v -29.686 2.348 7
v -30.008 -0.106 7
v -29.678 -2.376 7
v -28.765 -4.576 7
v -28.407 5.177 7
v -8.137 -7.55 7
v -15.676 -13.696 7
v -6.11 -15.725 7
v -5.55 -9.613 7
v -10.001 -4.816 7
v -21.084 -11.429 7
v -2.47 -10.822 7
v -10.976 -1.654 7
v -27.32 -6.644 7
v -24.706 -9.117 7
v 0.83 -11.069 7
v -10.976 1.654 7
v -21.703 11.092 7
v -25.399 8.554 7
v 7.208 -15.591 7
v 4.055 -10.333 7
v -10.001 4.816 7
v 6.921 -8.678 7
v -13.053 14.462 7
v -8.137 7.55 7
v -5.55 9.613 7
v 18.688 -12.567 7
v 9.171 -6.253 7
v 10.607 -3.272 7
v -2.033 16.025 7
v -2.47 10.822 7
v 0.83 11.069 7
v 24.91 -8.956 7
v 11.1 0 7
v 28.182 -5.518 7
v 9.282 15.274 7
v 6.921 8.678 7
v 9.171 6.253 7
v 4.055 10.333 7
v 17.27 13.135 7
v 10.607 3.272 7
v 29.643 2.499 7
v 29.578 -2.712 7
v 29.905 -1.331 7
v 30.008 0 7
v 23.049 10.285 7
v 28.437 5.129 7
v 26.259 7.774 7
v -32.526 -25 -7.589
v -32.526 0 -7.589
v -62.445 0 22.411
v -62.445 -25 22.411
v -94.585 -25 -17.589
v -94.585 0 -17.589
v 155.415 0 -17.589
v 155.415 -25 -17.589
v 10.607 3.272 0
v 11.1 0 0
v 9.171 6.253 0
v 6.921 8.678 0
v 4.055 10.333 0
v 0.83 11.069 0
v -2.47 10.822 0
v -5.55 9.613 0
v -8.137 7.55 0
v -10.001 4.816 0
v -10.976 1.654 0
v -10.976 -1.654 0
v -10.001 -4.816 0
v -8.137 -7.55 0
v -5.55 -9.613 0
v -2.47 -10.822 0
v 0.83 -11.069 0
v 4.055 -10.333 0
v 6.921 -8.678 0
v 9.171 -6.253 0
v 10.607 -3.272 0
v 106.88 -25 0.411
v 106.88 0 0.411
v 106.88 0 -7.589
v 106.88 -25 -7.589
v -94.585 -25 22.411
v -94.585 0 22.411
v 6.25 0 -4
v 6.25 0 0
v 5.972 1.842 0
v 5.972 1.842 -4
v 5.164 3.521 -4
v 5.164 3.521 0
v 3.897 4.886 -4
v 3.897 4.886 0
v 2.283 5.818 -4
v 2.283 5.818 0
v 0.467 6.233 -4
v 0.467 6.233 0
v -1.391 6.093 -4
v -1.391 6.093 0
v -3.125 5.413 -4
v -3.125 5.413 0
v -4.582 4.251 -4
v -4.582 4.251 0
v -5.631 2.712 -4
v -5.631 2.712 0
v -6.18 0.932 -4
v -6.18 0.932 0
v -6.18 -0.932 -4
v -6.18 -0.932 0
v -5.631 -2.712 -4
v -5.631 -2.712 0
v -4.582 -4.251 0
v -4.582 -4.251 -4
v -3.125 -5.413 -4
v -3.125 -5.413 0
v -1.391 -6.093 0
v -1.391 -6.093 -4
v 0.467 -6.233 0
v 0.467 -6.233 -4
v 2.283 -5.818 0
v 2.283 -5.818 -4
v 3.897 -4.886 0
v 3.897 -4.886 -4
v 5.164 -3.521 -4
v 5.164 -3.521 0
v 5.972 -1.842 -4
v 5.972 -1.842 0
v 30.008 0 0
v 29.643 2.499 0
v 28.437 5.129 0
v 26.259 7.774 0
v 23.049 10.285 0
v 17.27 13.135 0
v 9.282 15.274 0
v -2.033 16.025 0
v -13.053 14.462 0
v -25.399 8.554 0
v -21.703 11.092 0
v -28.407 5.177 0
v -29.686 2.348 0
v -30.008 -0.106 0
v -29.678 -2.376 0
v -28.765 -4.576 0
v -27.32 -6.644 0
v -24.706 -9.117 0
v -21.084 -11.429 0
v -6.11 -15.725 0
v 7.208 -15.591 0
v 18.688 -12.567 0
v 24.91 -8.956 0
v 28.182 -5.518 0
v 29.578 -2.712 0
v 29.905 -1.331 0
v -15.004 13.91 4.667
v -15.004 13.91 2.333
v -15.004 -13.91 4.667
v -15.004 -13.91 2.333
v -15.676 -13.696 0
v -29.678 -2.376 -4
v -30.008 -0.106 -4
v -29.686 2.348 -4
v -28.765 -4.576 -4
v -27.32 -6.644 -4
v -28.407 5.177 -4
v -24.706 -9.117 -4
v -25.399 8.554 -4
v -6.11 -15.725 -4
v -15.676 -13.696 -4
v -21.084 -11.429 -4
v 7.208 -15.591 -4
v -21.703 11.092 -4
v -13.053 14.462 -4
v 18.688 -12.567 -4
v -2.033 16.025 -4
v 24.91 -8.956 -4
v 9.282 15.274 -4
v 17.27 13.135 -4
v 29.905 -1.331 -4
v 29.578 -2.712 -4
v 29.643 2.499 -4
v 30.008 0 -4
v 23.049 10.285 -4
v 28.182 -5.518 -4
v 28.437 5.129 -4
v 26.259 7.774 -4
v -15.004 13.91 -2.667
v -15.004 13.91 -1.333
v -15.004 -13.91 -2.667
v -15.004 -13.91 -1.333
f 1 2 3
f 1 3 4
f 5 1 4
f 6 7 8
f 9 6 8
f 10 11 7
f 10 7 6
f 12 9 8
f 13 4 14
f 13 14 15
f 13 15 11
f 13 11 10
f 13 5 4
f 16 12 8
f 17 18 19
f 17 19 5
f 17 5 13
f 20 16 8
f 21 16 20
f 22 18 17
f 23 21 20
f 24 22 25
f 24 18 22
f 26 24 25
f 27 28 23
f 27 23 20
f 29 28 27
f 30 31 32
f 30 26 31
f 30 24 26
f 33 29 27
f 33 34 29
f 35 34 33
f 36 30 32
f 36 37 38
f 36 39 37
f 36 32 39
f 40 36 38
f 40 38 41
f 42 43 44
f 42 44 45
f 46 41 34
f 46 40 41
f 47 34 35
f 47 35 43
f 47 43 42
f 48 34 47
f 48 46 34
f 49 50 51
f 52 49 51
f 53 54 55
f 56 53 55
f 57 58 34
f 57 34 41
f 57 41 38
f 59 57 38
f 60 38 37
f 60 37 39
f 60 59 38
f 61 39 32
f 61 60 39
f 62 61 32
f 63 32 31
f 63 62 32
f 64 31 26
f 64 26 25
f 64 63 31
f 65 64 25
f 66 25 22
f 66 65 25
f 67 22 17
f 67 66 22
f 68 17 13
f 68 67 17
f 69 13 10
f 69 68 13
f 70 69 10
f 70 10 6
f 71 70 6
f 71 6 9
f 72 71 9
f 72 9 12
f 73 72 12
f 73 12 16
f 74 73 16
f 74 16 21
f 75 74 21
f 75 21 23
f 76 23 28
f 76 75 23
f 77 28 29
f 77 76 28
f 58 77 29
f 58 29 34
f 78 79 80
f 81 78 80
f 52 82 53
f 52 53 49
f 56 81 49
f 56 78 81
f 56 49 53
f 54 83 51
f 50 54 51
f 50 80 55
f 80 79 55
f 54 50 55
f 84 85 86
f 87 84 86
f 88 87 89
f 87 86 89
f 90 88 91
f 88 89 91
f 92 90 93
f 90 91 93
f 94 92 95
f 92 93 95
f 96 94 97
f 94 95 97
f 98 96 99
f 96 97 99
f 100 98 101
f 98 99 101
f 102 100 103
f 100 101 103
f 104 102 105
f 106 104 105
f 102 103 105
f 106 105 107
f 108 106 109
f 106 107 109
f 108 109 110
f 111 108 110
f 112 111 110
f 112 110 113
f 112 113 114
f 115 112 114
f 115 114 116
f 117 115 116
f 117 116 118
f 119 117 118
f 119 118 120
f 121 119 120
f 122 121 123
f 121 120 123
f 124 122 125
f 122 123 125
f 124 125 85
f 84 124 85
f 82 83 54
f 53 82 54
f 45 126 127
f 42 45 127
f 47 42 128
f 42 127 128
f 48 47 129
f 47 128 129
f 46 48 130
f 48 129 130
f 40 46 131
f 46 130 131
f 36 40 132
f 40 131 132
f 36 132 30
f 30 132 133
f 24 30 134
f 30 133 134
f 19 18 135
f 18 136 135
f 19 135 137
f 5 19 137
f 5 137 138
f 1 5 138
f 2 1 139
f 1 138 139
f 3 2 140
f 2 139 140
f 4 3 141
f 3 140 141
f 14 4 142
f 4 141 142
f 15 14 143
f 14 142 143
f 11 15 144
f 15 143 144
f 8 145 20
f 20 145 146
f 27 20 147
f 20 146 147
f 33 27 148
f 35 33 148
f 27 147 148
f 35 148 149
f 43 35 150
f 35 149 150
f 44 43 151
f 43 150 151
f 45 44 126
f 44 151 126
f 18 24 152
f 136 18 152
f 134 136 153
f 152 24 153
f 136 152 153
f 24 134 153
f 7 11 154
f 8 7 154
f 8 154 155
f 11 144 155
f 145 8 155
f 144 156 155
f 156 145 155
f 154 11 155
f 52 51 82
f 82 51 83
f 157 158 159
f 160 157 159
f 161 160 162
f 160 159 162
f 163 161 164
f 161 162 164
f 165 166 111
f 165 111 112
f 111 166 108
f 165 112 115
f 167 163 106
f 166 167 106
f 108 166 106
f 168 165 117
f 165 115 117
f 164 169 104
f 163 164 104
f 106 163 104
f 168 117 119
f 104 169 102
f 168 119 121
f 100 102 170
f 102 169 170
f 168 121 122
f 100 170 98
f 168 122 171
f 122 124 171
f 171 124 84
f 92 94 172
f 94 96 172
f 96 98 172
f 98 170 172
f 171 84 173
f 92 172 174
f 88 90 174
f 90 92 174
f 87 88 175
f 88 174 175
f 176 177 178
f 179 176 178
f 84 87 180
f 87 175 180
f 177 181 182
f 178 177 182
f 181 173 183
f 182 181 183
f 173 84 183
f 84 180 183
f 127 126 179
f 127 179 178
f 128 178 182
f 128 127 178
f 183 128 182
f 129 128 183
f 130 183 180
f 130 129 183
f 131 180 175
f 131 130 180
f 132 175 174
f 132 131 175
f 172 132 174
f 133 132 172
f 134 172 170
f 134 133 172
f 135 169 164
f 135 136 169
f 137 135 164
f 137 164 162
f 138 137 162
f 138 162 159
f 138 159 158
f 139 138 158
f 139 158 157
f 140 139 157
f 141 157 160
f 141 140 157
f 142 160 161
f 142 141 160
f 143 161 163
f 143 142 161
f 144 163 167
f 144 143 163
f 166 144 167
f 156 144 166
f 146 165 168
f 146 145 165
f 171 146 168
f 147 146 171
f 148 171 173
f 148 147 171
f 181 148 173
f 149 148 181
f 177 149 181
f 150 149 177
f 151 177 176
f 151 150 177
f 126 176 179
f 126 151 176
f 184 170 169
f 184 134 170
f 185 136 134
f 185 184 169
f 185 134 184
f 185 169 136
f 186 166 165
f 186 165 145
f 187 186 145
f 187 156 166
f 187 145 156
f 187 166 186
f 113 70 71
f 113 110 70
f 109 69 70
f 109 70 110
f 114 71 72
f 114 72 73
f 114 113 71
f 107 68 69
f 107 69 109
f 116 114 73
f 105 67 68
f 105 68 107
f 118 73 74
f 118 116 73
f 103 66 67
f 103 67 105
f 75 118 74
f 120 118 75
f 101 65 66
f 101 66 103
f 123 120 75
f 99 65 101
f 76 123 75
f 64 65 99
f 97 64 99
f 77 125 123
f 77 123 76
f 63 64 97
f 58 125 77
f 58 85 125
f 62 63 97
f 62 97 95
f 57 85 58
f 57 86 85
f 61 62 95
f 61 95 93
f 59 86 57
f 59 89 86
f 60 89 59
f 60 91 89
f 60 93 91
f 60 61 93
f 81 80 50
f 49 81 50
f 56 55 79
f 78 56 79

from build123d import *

# Parameters (mm, degrees)
F0_R     = 11.1
F1_DEPTH = 7
F0_R_2   = 6.25
F2_DEPTH = 4
F4_DEPTH = 25


with BuildPart() as f1:
    # F0 (on Top) → F1 (new body)
    with BuildSketch(Plane.XY):
        with BuildLine():
            add(Edge.make_bspline(
                [(30.008441139, 0), (30.008441139, 27.8192877463), (-15.0042205695, 13.9096438731), (-60.0168822779, 0), (-15.0042205695, -13.9096438731), (30.008441139, -27.8192877463), (30.008441139, 0)],
                knots=[0, 0, 0, 2.0943951024, 2.0943951024, 4.1887902048, 4.1887902048, 6.2831853072, 6.2831853072, 6.2831853072], degree=2, weights=[1, 0.5, 1, 0.5, 1, 0.5, 1]))
        make_face()
        Circle(F0_R, mode=Mode.SUBTRACT)
    extrude(amount=F1_DEPTH)

    # F0 (on Top) → F2 (join)
    with BuildSketch(Plane.XY):
        with BuildLine():
            add(Edge.make_bspline(
                [(30.008441139, 0), (30.008441139, 27.8192877463), (-15.0042205695, 13.9096438731), (-60.0168822779, 0), (-15.0042205695, -13.9096438731), (30.008441139, -27.8192877463), (30.008441139, 0)],
                knots=[0, 0, 0, 2.0943951024, 2.0943951024, 4.1887902048, 4.1887902048, 6.2831853072, 6.2831853072, 6.2831853072], degree=2, weights=[1, 0.5, 1, 0.5, 1, 0.5, 1]))
        make_face()
        Circle(F0_R, mode=Mode.SUBTRACT)
        Circle(F0_R)
        Circle(F0_R_2, mode=Mode.SUBTRACT)
    extrude(amount=-F2_DEPTH)


with BuildPart() as f4:
    # F3 (on Front) → F4 (new body)
    with BuildSketch(Plane.XZ):
        Polygon((106.8803320902, -7.5892007072), (-32.526427851, -7.5892007072), (-62.4454933861, 22.4107992928), (-94.5845730603, 22.4107992928), (-94.5845730603, -17.5892007072), (155.4154269397, -17.5892007072), (106.8803320902, 0.4107992928), align=None)
    extrude(amount=F4_DEPTH)


solid = Compound([f1.part, f4.part])
